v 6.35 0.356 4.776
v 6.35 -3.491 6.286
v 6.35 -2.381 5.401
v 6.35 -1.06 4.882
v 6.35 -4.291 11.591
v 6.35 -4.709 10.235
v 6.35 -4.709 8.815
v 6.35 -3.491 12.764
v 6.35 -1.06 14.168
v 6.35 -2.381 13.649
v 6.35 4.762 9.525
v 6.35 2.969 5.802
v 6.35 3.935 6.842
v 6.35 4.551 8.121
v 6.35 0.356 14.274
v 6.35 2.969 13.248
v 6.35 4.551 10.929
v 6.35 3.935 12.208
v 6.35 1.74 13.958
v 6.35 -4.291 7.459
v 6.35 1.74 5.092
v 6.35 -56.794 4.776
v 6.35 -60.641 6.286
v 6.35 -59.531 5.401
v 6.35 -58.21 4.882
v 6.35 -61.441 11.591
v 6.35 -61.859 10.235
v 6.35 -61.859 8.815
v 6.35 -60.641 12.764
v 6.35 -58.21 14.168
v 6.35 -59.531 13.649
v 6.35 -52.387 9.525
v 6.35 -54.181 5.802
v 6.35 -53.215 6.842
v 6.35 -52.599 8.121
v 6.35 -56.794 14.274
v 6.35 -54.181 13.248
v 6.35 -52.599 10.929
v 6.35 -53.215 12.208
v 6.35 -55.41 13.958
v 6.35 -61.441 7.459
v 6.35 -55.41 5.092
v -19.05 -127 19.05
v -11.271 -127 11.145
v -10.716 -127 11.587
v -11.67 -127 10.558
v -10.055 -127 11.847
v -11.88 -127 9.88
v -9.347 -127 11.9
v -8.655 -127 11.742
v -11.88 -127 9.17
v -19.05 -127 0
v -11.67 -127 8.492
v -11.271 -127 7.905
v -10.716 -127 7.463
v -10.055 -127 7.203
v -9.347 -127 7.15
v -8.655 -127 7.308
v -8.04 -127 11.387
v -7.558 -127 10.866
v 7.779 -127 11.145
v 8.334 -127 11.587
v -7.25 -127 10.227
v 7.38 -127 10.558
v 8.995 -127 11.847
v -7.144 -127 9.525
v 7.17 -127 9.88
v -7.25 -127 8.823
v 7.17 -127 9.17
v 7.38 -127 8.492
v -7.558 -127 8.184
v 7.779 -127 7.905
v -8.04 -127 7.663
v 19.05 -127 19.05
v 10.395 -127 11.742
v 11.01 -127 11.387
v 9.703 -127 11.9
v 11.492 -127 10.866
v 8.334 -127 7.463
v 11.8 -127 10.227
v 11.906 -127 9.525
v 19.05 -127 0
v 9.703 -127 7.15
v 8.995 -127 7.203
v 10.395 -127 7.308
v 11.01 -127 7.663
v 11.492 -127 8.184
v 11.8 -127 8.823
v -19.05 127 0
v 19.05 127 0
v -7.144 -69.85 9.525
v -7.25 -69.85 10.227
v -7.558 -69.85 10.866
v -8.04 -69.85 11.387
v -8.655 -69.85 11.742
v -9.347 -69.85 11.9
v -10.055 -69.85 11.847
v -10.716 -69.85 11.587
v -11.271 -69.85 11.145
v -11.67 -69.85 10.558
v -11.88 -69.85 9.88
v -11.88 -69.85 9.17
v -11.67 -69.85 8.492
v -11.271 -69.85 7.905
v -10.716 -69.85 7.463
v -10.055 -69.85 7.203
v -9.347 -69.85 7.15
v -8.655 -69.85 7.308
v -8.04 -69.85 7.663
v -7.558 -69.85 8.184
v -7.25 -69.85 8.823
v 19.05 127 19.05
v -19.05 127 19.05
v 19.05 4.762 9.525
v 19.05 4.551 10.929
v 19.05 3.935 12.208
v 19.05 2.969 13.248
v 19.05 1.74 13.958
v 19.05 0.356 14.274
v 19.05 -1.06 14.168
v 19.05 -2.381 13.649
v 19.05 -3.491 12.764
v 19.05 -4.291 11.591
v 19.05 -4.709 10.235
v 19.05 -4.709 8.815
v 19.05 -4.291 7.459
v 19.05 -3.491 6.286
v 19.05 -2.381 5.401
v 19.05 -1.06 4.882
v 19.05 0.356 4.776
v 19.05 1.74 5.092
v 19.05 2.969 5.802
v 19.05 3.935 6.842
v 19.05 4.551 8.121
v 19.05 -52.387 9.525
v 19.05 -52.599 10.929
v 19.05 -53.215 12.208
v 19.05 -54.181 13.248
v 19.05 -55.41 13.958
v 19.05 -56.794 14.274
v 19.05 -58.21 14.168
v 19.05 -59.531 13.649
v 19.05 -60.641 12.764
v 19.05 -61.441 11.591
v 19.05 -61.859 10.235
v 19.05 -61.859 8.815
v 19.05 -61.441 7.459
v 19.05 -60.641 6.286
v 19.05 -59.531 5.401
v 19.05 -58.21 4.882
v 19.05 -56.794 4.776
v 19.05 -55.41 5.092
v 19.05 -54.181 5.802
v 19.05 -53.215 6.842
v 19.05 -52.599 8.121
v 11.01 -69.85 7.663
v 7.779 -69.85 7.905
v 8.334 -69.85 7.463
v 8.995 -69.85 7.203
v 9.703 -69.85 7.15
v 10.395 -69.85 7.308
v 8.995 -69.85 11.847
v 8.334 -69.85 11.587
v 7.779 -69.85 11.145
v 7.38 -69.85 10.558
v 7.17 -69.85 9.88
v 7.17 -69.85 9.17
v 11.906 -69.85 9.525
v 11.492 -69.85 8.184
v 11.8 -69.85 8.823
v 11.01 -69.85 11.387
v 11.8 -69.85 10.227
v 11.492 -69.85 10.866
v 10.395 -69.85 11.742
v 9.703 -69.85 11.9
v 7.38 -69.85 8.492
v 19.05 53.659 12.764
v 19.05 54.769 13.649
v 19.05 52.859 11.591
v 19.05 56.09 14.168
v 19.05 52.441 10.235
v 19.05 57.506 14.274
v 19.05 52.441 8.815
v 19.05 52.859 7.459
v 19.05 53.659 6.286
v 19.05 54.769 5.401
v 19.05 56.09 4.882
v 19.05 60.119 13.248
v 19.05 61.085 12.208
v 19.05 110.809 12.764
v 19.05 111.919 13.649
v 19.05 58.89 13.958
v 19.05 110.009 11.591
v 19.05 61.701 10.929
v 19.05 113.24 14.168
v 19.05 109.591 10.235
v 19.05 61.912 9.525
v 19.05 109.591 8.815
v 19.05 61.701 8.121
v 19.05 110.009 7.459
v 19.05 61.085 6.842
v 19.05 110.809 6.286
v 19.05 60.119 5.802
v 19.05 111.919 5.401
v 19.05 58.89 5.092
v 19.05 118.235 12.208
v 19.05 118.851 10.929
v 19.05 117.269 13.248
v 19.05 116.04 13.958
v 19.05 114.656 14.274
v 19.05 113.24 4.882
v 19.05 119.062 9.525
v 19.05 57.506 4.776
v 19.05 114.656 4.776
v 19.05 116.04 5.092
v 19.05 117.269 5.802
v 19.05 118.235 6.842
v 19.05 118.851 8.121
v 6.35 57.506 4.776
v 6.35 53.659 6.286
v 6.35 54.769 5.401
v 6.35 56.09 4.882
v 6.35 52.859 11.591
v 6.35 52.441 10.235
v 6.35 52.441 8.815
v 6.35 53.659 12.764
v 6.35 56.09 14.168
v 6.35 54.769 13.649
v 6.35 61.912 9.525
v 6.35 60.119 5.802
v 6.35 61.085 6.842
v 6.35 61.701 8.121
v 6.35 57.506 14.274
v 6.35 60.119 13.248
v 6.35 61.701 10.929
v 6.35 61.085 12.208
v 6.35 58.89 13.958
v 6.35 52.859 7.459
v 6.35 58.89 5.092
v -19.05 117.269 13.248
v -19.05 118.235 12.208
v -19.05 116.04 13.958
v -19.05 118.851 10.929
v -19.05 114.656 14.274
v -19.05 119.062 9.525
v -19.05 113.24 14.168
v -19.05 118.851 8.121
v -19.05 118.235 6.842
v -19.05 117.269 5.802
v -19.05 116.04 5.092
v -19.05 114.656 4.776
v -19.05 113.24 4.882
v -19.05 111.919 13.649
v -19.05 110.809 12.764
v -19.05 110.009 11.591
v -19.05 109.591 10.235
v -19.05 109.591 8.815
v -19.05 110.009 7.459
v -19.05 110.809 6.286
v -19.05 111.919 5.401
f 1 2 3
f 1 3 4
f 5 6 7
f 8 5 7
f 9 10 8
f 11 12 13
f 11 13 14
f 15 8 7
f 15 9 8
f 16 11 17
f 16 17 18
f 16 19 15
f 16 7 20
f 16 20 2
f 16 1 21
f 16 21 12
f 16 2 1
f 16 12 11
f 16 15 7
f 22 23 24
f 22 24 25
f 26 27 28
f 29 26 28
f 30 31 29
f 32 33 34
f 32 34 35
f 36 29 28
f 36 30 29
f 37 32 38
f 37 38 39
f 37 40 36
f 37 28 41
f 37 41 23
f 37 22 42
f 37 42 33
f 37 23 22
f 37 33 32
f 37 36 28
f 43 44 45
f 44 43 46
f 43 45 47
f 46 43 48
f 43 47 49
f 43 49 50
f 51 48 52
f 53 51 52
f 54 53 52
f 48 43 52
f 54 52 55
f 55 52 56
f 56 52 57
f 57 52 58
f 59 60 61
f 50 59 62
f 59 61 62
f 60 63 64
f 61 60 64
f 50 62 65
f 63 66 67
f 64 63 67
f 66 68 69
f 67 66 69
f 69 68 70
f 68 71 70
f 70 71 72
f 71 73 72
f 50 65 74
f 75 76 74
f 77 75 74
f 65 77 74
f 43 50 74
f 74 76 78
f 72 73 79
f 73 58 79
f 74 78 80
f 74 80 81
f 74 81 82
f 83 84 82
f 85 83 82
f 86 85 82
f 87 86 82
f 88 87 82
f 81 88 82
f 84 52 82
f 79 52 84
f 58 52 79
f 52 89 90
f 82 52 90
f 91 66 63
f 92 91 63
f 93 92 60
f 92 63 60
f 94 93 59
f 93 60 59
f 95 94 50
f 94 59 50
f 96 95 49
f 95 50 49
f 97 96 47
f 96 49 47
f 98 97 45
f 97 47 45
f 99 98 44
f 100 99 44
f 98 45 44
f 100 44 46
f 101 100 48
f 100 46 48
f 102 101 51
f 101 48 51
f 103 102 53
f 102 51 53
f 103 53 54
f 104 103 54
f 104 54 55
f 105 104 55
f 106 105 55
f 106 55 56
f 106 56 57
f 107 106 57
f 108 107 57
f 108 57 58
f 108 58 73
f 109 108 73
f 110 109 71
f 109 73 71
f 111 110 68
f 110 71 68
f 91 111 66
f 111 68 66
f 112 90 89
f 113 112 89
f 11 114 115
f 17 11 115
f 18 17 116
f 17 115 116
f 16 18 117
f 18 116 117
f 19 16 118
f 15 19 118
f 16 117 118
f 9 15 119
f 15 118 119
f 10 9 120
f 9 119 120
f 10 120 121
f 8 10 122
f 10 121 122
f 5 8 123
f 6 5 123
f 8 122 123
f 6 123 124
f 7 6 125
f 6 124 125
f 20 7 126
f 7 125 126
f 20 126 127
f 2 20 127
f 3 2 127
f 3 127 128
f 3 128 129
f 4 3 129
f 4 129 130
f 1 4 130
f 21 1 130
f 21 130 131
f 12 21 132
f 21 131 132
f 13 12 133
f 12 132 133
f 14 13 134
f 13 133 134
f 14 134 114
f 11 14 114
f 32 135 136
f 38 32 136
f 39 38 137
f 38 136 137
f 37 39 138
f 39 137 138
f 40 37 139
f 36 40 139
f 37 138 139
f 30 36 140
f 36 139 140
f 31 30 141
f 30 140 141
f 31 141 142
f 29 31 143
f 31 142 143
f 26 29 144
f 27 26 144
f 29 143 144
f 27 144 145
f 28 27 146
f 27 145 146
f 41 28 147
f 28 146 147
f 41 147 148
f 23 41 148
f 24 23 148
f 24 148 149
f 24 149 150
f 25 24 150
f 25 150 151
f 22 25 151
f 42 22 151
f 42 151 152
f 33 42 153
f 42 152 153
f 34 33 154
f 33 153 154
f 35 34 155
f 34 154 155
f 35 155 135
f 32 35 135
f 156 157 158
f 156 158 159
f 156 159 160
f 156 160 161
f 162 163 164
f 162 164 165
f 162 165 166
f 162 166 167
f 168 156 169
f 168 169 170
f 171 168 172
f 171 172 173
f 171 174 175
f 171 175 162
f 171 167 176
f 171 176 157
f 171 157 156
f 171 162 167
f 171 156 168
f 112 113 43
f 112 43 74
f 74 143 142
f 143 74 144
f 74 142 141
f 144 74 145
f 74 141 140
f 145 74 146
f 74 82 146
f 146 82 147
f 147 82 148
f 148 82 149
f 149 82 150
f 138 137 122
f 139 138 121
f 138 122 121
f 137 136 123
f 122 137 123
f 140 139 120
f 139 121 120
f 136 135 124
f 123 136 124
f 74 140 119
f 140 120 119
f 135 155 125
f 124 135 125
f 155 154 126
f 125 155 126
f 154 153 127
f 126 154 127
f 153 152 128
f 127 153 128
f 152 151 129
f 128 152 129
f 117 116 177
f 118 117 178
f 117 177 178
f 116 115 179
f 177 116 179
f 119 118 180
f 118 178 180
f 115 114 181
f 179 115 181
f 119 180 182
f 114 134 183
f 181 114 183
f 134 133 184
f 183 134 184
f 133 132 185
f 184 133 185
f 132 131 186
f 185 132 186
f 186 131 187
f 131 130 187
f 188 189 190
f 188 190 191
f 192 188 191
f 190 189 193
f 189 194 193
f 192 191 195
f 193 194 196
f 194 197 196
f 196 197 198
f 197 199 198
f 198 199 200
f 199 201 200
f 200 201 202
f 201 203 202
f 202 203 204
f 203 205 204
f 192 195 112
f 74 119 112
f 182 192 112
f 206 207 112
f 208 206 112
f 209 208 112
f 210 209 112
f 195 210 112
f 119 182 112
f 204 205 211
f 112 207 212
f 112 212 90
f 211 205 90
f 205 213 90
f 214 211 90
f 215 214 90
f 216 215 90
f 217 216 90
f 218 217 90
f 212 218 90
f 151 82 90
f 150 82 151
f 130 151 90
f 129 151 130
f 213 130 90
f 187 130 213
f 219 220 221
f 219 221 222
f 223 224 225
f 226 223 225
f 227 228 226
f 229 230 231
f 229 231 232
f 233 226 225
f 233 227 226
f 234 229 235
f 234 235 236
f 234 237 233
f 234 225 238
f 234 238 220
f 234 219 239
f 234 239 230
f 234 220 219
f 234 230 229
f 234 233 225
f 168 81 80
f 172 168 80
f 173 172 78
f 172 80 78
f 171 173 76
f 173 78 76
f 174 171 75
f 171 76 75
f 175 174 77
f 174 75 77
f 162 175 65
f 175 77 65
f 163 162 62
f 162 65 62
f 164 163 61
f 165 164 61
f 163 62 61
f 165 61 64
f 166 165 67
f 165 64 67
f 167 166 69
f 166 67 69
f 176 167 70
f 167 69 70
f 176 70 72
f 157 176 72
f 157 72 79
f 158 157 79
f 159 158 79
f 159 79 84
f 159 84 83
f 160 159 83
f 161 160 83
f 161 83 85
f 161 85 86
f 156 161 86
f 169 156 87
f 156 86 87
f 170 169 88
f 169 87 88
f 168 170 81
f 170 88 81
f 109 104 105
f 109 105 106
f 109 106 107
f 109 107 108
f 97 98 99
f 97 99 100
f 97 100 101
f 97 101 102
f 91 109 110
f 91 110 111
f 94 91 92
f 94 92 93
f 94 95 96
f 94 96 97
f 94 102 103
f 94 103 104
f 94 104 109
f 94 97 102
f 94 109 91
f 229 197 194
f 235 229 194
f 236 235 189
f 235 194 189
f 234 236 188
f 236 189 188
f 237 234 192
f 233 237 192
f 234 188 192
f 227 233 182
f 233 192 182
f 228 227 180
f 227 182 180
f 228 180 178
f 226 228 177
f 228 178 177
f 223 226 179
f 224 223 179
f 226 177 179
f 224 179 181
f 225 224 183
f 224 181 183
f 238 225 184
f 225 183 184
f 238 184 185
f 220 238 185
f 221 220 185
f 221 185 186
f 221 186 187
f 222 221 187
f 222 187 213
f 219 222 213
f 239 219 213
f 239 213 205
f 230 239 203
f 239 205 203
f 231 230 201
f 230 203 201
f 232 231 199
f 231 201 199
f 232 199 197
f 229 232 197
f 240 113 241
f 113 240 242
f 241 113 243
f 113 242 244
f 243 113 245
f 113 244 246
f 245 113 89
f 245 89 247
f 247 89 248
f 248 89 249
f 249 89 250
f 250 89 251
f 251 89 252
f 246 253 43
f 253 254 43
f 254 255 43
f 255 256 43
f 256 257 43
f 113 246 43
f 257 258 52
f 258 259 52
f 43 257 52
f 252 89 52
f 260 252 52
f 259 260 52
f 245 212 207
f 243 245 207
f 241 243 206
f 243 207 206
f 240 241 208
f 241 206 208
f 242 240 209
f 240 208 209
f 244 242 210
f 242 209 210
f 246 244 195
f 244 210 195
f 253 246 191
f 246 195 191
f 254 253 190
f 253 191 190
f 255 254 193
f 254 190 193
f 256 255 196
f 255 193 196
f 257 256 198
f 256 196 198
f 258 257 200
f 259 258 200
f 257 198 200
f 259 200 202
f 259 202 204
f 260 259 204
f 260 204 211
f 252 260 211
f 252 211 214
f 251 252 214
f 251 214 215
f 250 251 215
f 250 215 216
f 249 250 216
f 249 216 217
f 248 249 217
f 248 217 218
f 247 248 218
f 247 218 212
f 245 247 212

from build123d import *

# Parameters (mm, degrees)
F1_DEPTH = 19.05
F2_R     = 4.7625
F3_DEPTH = 38.101
F4_R     = 2.38125
F5_DEPTH = 57.15
F6_DEPTH = 12.7


with BuildPart() as f1:
    # F0 (on Top) → F1 (new body)
    with BuildSketch(Plane.XY):
        Polygon((19.05, -127), (19.05, 127), (12.7, 127), (-19.05, 63.5), (-19.05, -127), align=None)
        Polygon((-19.05, 63.5), (12.7, 127), (-19.05, 127), align=None)
    extrude(amount=F1_DEPTH)

    # F2 (on face) → F3 (cut, through all)
    with BuildSketch(Plane.YZ.offset(19.05)):
        with Locations((114.3, 9.525)):
            Circle(F2_R)
    extrude(amount=-F3_DEPTH, mode=Mode.SUBTRACT)

    # F4 (on face) → F5 (cut)
    with BuildSketch(Plane.XZ.offset(127)):
        with Locations((-9.525, 9.525)):
            Circle(F4_R)
        with Locations((9.525, 9.525)):
            Circle(F4_R)
    extrude(amount=-F5_DEPTH, mode=Mode.SUBTRACT)

    # F2 (on face) → F6 (cut)
    with BuildSketch(Plane.YZ.offset(19.05)):
        with Locations((-57.15, 9.525)):
            Circle(F2_R)
        with Locations((0, 9.525)):
            Circle(F2_R)
        with Locations((57.15, 9.525)):
            Circle(F2_R)
    extrude(amount=-F6_DEPTH, mode=Mode.SUBTRACT)


solid = f1.part
